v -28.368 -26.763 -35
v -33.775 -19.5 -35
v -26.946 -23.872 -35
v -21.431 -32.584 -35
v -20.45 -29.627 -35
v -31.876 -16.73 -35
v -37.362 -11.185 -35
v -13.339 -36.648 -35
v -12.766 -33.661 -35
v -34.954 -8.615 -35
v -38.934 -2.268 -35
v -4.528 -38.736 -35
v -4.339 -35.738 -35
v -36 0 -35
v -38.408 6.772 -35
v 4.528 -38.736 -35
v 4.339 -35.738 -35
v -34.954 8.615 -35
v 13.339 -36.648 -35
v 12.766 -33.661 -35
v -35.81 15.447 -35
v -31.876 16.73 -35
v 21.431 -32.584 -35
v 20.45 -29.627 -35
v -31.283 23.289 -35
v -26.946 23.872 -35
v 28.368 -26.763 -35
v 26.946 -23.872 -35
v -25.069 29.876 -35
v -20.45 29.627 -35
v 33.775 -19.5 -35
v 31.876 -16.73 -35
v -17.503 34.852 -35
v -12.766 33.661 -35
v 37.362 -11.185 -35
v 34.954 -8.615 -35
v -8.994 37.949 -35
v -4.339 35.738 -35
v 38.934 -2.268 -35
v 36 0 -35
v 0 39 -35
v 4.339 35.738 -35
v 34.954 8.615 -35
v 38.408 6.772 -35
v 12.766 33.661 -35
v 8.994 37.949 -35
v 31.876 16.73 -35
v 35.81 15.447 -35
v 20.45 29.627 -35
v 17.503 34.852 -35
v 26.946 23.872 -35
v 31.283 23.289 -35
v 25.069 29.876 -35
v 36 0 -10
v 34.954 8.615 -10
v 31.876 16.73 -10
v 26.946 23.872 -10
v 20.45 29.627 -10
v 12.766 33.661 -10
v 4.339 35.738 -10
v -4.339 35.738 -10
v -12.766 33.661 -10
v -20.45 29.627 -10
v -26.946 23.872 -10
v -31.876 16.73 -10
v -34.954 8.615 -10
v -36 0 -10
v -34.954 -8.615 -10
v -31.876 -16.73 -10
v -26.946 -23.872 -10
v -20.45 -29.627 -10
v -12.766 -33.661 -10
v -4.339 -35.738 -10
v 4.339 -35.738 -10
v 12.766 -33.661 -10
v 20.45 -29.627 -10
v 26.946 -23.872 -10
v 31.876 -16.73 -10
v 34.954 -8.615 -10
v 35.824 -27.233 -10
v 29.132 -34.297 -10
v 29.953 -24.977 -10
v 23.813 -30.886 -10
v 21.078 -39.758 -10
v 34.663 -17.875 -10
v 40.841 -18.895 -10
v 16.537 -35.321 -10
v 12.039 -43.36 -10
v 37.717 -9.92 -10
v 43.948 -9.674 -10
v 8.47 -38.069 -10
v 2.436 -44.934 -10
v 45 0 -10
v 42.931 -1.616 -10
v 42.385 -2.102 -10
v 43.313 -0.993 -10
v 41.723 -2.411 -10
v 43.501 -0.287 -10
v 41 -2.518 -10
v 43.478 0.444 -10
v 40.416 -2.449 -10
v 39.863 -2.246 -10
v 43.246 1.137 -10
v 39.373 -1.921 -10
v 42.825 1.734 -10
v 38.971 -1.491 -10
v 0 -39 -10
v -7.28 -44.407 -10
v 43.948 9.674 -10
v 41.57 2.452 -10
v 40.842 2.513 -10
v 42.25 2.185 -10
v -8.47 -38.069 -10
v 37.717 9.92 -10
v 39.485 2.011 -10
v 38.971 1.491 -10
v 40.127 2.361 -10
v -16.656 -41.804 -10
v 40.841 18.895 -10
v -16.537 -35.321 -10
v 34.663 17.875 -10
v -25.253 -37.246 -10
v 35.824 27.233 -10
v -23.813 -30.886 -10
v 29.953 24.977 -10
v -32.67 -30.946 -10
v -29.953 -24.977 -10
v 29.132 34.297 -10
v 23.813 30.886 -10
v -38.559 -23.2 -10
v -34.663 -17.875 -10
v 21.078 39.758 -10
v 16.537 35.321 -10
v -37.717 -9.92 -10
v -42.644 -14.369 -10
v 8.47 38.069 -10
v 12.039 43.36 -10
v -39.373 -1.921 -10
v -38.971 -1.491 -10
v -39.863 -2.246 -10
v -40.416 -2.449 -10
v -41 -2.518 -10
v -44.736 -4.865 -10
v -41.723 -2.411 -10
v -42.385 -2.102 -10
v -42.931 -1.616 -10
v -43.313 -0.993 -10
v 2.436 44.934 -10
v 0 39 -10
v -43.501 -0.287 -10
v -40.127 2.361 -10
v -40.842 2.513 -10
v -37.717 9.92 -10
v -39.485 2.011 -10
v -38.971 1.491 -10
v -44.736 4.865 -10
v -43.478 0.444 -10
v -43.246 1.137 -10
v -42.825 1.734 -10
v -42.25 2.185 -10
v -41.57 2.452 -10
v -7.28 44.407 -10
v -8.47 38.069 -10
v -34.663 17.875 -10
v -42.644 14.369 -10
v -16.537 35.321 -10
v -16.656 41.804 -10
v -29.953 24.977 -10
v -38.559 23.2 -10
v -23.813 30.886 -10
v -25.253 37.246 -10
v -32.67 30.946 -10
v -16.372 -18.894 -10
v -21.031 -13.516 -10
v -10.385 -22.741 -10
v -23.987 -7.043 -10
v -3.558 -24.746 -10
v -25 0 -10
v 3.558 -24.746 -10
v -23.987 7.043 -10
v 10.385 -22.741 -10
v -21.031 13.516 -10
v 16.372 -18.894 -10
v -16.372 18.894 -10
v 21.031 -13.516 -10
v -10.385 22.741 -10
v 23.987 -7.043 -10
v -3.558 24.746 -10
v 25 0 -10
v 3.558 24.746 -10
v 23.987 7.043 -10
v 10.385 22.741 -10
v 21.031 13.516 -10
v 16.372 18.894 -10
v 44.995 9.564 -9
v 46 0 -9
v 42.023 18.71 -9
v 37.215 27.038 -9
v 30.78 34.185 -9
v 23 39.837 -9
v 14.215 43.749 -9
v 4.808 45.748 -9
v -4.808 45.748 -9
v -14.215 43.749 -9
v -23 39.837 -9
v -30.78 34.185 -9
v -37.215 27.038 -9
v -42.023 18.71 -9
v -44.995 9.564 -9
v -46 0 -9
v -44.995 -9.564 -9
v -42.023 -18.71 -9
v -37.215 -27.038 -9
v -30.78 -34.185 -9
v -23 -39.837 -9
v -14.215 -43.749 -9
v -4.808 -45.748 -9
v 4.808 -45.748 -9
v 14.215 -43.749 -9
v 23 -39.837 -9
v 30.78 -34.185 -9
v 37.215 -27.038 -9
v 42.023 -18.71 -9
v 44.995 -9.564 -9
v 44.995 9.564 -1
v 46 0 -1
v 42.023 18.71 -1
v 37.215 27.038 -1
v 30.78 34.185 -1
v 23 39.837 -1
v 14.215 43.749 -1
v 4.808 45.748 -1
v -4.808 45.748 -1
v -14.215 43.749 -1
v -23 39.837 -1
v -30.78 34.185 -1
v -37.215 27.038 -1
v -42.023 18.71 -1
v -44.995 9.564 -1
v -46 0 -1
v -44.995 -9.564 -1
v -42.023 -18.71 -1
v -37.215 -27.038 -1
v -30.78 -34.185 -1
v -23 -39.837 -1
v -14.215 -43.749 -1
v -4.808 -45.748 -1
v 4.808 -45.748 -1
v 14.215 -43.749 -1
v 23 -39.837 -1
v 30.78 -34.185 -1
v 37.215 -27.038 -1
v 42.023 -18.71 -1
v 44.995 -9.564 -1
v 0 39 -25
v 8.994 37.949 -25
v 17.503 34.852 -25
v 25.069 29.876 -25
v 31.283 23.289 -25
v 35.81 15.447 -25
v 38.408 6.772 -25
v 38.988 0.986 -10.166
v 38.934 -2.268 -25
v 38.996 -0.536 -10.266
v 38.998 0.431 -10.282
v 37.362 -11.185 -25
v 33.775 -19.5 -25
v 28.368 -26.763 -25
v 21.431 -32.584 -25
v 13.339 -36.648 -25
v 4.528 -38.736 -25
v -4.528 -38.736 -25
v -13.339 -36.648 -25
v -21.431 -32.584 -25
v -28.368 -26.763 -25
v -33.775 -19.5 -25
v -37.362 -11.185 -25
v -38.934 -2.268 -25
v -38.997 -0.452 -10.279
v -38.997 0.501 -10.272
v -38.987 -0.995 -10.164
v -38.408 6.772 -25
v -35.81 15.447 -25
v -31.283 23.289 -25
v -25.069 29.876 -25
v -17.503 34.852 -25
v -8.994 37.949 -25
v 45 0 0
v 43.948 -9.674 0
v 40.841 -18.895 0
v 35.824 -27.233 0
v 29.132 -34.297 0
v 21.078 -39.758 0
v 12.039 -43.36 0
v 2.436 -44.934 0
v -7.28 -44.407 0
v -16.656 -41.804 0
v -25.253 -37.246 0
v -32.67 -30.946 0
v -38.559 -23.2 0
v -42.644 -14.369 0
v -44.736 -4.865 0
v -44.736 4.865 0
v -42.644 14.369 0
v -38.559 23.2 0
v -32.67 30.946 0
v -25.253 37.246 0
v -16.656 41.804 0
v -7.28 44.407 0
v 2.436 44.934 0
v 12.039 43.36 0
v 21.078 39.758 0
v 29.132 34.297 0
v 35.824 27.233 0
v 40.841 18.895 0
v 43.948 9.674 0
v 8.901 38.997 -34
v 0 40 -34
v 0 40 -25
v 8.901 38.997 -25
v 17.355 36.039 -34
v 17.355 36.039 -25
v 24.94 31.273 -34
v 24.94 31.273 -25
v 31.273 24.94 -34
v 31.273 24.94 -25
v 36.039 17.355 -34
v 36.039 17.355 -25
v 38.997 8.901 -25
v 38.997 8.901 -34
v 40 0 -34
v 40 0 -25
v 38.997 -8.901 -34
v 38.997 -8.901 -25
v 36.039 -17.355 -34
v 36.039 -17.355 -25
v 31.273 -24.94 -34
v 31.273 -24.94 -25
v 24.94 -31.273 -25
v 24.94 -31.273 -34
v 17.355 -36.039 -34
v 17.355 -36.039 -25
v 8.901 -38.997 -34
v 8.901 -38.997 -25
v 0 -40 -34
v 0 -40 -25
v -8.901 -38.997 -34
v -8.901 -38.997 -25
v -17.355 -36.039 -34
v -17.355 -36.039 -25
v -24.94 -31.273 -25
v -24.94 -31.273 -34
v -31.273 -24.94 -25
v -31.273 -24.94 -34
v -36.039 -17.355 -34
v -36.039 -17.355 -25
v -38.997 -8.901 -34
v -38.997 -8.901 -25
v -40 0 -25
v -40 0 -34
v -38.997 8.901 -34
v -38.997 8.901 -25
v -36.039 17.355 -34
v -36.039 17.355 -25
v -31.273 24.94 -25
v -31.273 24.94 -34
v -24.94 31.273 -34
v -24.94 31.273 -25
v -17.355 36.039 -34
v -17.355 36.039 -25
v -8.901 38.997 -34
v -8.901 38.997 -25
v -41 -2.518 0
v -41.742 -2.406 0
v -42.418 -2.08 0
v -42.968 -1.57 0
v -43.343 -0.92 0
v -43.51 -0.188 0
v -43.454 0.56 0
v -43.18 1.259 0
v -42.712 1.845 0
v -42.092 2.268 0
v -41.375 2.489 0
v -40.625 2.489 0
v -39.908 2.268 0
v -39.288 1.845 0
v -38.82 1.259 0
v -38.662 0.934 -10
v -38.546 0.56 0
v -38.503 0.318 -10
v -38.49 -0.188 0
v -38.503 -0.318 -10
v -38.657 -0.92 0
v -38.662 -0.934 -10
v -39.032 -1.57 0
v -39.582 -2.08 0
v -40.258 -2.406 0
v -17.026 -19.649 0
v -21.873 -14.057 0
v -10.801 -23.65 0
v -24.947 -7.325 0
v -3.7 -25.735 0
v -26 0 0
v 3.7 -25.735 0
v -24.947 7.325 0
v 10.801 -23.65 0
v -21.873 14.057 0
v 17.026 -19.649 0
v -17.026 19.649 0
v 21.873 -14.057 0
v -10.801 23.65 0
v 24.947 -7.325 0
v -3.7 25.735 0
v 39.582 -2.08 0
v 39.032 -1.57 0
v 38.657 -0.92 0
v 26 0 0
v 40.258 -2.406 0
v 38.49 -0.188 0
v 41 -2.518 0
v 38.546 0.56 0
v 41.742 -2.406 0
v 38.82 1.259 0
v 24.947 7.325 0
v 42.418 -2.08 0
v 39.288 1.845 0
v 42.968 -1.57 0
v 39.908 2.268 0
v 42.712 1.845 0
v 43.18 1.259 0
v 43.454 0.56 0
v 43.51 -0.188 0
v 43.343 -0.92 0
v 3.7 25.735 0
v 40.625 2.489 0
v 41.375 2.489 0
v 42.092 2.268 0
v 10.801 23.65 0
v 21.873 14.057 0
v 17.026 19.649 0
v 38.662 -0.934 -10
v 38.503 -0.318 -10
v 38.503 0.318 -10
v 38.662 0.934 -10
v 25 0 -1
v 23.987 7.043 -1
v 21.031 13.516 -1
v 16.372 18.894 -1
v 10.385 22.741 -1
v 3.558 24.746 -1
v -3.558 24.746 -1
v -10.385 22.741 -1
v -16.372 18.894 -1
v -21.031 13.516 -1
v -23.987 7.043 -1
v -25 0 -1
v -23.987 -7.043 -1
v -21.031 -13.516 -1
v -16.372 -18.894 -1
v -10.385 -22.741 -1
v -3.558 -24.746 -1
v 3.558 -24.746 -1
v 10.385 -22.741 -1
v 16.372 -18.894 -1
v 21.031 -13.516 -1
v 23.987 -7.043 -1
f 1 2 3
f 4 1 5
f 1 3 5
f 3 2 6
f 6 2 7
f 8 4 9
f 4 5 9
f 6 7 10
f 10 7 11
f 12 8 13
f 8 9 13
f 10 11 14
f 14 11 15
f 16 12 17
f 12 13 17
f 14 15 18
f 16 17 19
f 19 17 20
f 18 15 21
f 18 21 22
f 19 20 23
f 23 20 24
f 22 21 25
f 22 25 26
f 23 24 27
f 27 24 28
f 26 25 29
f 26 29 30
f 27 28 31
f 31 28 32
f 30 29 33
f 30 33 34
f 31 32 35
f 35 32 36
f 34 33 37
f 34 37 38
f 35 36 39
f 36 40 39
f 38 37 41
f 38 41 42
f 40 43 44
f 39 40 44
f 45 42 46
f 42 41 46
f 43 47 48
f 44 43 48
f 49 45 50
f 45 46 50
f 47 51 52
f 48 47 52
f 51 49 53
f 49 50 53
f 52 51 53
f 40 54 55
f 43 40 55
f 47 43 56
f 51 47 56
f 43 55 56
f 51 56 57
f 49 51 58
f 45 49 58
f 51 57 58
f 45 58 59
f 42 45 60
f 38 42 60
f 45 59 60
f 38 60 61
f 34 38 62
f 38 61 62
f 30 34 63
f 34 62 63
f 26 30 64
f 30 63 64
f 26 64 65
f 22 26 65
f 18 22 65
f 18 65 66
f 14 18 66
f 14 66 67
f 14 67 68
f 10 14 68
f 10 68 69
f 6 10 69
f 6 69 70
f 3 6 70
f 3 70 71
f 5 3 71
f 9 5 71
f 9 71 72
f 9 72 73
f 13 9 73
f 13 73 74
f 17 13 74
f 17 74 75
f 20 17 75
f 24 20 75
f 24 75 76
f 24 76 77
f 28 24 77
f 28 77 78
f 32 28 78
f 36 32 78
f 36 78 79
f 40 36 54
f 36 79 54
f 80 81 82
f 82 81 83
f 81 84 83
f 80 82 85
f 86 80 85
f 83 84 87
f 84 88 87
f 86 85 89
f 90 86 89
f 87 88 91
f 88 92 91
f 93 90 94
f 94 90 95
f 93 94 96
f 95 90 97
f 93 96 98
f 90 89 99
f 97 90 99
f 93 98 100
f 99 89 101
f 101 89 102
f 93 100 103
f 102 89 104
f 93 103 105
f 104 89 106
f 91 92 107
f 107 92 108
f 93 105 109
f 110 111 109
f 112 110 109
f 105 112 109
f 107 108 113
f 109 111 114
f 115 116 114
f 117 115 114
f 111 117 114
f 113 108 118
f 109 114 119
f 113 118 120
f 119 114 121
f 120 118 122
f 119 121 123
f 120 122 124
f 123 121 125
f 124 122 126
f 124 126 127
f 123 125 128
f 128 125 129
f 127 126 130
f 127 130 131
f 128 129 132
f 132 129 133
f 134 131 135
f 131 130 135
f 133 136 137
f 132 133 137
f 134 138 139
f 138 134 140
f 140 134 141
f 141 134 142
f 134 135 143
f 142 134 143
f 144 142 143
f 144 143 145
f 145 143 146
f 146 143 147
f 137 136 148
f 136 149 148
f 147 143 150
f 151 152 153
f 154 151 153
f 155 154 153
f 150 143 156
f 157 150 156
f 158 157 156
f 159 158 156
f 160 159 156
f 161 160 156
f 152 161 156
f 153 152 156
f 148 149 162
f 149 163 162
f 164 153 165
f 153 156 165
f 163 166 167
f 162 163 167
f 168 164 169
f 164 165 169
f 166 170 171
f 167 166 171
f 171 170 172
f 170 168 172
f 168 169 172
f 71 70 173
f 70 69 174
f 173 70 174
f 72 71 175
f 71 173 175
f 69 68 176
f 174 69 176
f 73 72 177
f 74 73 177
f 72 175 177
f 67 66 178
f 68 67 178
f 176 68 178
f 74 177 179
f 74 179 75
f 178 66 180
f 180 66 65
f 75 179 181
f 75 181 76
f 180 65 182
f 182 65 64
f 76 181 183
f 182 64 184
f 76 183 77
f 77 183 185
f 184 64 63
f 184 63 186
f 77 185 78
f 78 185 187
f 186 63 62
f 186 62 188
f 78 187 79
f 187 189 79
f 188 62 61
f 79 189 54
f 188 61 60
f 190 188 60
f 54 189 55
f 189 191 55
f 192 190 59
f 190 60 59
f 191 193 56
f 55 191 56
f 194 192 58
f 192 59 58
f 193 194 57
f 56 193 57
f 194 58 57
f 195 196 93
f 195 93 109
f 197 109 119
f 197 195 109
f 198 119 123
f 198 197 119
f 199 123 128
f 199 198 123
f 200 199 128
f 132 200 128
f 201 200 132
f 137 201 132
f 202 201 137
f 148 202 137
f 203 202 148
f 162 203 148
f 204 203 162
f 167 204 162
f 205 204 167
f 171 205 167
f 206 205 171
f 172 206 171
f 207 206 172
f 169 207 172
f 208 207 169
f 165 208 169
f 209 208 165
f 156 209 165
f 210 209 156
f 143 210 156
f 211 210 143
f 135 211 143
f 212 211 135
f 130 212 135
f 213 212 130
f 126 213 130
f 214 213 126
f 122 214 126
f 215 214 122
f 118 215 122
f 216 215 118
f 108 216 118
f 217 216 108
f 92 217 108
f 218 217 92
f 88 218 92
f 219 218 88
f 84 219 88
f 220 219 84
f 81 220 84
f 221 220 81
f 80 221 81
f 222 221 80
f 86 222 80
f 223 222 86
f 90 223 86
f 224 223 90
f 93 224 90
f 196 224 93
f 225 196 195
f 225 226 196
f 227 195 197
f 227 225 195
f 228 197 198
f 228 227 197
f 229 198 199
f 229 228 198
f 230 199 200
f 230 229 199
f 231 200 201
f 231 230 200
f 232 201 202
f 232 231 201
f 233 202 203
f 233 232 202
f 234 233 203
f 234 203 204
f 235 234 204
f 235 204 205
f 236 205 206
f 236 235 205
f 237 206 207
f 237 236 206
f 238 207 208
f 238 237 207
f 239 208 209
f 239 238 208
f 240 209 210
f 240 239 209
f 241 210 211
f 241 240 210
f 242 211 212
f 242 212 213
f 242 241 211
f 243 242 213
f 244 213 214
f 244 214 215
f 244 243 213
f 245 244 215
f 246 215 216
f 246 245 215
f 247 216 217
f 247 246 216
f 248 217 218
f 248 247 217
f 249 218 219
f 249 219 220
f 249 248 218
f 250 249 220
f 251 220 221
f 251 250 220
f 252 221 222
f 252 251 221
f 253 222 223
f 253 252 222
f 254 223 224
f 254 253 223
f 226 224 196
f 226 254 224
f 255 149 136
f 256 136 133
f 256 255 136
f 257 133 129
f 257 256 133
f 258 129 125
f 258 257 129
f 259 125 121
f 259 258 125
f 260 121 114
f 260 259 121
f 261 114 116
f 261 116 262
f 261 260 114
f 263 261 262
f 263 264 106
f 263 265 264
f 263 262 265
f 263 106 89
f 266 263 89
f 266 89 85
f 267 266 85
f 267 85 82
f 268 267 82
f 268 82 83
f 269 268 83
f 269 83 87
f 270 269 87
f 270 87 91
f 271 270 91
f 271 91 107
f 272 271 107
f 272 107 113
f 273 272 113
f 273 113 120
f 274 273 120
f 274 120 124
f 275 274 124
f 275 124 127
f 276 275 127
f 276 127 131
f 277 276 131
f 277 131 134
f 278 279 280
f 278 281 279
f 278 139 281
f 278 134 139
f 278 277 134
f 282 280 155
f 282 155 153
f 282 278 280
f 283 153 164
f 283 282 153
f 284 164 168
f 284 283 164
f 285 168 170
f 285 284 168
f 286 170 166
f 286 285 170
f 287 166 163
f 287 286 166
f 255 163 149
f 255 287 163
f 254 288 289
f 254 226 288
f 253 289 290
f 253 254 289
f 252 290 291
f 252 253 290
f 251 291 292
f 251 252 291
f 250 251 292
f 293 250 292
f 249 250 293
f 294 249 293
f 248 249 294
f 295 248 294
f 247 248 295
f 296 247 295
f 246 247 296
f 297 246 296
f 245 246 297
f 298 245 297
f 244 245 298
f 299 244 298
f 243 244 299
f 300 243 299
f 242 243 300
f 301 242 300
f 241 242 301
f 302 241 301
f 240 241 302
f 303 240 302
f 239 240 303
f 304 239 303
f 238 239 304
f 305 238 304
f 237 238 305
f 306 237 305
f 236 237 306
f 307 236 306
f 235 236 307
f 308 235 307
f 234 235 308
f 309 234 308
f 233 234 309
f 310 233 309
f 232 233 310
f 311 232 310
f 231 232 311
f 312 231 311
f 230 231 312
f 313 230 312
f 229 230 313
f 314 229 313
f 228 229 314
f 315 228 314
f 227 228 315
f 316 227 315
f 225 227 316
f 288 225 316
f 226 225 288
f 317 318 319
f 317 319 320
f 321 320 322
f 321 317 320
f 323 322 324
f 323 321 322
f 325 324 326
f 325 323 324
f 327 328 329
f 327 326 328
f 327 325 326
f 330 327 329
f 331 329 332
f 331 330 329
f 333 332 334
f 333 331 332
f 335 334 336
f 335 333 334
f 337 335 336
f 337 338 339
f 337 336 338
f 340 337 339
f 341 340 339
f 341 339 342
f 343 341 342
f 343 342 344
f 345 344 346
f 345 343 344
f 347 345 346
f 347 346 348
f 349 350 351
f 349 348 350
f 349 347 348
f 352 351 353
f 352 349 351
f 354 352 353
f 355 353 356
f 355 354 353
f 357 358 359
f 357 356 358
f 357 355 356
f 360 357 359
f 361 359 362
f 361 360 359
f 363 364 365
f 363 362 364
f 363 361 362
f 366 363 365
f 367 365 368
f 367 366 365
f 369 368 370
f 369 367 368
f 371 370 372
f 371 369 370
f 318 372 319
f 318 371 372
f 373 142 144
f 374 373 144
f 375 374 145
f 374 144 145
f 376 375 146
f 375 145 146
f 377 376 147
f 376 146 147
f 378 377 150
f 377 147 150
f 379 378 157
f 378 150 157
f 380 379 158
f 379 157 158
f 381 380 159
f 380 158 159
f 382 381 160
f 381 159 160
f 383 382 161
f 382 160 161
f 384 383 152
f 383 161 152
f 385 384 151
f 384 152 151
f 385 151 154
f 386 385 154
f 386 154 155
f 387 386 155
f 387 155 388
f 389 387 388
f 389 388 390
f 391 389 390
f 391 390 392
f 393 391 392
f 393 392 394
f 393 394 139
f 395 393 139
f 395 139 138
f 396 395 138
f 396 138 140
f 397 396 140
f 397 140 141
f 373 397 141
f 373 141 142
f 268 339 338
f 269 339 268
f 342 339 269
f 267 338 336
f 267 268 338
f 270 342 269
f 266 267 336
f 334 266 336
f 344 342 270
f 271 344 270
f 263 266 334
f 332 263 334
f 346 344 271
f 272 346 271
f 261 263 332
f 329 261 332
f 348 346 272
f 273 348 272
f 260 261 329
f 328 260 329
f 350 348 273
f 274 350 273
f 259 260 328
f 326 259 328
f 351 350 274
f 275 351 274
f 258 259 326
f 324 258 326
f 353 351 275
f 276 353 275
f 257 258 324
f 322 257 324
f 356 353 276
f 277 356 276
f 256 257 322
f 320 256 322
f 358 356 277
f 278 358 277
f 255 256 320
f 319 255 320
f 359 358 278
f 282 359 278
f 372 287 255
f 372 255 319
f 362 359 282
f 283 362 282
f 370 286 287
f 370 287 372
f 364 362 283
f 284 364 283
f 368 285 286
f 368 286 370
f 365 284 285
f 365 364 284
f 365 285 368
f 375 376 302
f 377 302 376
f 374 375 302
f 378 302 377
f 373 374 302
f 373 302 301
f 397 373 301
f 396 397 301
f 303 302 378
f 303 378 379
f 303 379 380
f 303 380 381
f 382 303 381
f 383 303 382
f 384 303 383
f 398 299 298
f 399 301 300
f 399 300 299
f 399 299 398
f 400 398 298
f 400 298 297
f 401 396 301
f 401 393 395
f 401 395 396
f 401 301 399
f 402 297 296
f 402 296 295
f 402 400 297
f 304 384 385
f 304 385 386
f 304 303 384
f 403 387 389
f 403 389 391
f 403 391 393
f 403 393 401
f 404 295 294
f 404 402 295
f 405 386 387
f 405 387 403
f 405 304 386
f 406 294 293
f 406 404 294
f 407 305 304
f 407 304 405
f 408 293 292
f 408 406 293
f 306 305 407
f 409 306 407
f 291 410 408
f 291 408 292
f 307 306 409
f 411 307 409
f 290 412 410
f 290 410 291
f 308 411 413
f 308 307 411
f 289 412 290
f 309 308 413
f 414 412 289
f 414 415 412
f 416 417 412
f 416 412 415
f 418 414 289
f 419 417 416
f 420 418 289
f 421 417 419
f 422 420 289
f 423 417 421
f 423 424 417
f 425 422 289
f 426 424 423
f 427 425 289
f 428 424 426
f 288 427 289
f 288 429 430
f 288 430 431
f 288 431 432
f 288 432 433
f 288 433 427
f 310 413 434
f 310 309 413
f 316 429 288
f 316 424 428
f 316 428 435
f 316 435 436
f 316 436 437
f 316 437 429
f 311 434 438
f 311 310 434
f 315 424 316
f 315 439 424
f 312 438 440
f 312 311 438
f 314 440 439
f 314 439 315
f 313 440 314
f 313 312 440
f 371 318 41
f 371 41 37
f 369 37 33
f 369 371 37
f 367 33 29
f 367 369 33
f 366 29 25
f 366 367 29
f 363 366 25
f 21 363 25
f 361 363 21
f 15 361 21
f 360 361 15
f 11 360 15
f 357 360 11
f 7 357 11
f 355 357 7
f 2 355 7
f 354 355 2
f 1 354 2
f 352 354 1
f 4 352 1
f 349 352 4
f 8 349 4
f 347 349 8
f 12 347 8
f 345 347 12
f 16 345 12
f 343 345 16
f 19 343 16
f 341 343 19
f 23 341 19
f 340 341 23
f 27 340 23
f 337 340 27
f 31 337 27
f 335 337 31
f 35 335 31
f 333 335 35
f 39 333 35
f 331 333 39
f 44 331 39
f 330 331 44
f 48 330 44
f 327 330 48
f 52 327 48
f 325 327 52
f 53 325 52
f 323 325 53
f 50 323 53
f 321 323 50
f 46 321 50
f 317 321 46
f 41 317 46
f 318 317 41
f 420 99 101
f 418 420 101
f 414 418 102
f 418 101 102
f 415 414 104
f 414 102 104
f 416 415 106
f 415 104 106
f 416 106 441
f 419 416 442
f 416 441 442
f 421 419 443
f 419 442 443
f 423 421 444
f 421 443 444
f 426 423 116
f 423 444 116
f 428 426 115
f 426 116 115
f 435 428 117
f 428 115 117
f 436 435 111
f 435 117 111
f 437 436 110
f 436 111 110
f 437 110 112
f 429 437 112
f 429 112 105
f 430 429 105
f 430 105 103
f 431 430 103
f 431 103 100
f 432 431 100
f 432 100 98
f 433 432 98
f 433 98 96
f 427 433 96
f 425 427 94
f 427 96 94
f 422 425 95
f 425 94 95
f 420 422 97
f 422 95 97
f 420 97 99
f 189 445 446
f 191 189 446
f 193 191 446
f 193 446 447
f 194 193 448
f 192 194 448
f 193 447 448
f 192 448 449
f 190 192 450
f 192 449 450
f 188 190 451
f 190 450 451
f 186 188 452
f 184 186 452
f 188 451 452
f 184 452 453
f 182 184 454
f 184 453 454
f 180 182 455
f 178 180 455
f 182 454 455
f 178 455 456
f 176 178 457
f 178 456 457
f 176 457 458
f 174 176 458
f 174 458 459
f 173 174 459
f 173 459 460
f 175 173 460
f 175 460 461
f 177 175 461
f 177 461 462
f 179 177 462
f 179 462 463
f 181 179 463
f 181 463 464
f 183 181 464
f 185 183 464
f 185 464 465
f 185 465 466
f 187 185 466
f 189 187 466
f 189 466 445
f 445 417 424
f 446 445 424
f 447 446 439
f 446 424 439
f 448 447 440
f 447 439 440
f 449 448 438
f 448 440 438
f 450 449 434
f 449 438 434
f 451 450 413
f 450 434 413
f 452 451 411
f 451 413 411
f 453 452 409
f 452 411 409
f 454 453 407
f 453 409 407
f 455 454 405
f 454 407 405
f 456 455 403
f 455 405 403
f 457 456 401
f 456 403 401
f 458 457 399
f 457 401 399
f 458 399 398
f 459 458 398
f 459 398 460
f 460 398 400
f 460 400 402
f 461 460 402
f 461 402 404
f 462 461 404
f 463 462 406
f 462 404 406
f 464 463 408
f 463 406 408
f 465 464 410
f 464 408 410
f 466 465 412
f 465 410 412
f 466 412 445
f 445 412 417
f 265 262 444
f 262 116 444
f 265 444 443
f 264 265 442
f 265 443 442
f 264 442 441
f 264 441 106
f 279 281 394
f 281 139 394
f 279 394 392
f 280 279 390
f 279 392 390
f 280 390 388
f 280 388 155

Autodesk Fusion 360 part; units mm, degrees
sketch "Sketch2" plane through (0, 0, 0) normal (0, 0, 1) x (1, 0, 0)
  circle A0 centre (0, 0) radius 46
  circle A1 centre (0, 0) radius 25
  line L0 (0, 1.75) -> (0, 22.5) construction
  circle A2 centre (0, 0) radius 36
  point P0 (-41, 0)
  point P1 (41, 0)
  dimension "d4" = 50
  dimension "d5" = 82
  dimension "d6" = 92
  dimension "d7" = -10
extrude "Extrude1" add sketch "Sketch2" against normal blind 35 contours A0
extrude "Extrude2" add sketch "Sketch2" against normal blind 10 contours A2
hole "Hole1" at (-41, 0, 0) at (41, 0, 0) direction (0, 0, -1) diameter 5.035 depth 10 tip angle 118
sketch "Sketch3" plane through (0, 0, 0) normal (1, 0, 0) x (0, 0, -1)
  line L0 (10, 46) -> (10, 39)
  line L1 (10, 39) -> (25, 39)
  line L2 (25, 39) -> (25, 40)
  line L3 (25, 40) -> (35, 40)
  line L4 (-1.75, 0) -> (-22.5, 0) construction
  line L5 (35, -46) -> (35, 46)
  line L6 (0, 46) -> (0, -46)
  line L7 (35, 46) -> (10, 46)
  dimension "d15" = 40
  dimension "d16" = 1
  dimension "d17" = 25
  dimension "d18" = 10
revolve "Revolve1" cut sketch "Sketch3" angle 360 about axis through (0, 0, 1.75) along (0, 0, 1)
chamfer "Chamfer1" distance 1 angle 45 4 edges at (-42.8871, -16.6343, 0) (-42.8871, -16.6343, -10) (-14.4646, -37.2931, -35) (-23.3082, 9.0404, 0)
